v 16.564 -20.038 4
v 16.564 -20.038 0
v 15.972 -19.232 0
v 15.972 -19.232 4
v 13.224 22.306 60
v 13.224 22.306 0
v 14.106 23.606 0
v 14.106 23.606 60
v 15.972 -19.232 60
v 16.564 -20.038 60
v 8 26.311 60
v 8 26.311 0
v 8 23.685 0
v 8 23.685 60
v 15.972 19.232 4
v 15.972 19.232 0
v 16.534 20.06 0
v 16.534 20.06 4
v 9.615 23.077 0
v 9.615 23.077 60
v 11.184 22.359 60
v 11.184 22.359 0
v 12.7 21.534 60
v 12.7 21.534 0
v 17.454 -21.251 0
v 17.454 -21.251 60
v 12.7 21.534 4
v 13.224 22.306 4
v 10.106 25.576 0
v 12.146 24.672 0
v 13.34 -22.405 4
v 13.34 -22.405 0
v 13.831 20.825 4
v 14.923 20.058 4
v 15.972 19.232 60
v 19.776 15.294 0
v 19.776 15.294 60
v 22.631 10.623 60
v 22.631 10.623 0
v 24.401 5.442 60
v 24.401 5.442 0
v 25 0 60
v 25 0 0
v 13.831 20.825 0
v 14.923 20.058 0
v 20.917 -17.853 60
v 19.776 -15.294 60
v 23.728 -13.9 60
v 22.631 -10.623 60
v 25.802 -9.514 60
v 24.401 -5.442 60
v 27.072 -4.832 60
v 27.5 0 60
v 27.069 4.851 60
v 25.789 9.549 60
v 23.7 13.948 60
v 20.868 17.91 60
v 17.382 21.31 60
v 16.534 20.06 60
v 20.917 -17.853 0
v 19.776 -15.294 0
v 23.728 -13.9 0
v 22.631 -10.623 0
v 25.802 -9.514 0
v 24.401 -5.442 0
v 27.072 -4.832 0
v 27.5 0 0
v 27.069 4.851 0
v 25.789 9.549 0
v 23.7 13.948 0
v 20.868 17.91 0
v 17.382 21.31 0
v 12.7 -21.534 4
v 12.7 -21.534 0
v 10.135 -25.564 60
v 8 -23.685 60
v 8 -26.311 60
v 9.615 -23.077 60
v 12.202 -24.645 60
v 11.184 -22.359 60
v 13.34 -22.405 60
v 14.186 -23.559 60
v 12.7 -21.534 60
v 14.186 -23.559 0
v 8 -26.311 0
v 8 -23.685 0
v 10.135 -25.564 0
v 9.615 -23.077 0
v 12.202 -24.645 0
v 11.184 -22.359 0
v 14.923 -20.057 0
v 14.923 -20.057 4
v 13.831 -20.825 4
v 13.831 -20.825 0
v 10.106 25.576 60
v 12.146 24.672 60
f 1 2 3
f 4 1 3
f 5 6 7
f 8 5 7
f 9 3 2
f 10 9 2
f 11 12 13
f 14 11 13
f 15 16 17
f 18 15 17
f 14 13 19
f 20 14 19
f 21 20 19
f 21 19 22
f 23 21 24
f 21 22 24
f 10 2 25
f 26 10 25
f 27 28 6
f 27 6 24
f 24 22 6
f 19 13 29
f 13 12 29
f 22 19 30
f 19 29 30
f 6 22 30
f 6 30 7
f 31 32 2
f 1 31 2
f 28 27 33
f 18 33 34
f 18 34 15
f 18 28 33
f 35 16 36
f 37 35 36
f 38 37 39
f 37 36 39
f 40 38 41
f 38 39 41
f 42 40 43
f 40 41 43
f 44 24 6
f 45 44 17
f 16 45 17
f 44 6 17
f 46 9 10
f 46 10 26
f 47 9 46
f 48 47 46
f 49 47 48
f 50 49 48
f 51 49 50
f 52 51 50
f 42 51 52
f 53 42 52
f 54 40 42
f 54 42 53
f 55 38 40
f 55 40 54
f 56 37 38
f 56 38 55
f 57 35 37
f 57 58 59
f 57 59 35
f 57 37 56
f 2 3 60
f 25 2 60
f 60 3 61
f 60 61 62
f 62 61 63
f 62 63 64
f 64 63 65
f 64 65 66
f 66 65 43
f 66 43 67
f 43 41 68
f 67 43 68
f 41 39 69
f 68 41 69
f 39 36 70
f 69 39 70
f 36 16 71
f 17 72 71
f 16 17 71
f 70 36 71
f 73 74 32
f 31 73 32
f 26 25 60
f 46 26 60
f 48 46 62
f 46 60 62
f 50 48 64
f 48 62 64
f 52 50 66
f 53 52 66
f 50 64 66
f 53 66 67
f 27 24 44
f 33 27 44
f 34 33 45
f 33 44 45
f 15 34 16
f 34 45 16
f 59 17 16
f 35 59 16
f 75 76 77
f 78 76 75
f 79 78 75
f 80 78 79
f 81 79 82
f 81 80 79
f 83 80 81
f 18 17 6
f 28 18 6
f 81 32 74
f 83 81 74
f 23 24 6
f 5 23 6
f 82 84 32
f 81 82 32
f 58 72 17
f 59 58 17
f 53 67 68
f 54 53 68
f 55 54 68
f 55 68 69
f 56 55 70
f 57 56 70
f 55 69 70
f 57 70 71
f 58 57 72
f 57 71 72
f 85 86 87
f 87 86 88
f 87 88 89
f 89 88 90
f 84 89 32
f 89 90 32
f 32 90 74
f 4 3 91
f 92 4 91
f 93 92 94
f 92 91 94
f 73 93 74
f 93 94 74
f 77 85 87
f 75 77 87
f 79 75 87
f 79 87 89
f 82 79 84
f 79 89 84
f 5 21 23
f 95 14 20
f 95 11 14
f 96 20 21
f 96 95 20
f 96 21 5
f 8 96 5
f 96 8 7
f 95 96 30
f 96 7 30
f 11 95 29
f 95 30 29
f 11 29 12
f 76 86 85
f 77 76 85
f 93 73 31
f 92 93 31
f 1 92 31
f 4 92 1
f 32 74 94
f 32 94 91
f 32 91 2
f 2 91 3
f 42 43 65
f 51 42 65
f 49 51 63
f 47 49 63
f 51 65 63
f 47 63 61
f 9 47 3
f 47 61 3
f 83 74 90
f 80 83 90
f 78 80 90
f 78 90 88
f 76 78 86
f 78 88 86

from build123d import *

# Parameters (mm, degrees)
F1_DEPTH = 60
F2_DEPTH = 4


with BuildPart() as f1:
    # F0 (on Top) → F1 (new body)
    with BuildSketch(Plane.XY):
        with BuildLine():
            ThreePointArc((8, 23.6854385647), (10.4057353896, 22.7314907342), (12.6999615998, 21.5339493676))
            Line((12.6999615998, 21.5339493676), (13.2236473386, 22.3057931922))
            Line((13.2236473386, 22.3057931922), (14.1061536293, 23.6064912638))
            ThreePointArc((14.1061536293, 23.6064912638), (11.135466667, 25.1446094046), (8, 26.3106442338))
            Line((8, 26.3106442338), (8, 23.6854385647))
        make_face()
    extrude(amount=F1_DEPTH)


with BuildPart() as f1b:
    # F0 (on Top) → F1, piece 2 (new body)
    with BuildSketch(Plane.XY):
        with BuildLine():
            ThreePointArc((15.9722274119, 19.2324712792), (22.6307941232, 10.6229542667), (25, 0))
            ThreePointArc((25, 0), (22.6308481128, -10.6228392483), (15.9724229044, -19.2323089244))
            Line((15.9724229044, -19.2323089244), (16.5641458304, -20.0384503381))
            Line((16.5641458304, -20.0384503381), (17.4541433848, -21.2509500659))
            ThreePointArc((17.4541433848, -21.2509500659), (24.8620085983, -11.7528944715), (27.5, 0))
            ThreePointArc((27.5, 0), (24.8420158665, 11.7950942212), (17.3818728955, 21.310103112))
            Line((17.3818728955, 21.310103112), (16.5336807988, 20.0599796442))
            Line((16.5336807988, 20.0599796442), (15.9722274119, 19.2324712792))
        make_face()
    extrude(amount=F1_DEPTH)


with BuildPart() as f1c:
    # F0 (on Top) → F1, piece 3 (new body)
    with BuildSketch(Plane.XY):
        with BuildLine():
            Line((13.3395801756, -22.405342042), (12.6999615998, -21.5339493676))
            ThreePointArc((12.6999615998, -21.5339493676), (10.4057353896, -22.7314907342), (8, -23.6854385647))
            Line((8, -23.6854385647), (8, -26.3106442338))
            ThreePointArc((8, -26.3106442338), (11.1780514023, -25.1257072905), (14.18606212, -23.5585577132))
            Line((14.18606212, -23.5585577132), (13.3395801756, -22.405342042))
        make_face()
    extrude(amount=F1_DEPTH)


with BuildPart() as f2:
    # F0 (on Top) → F2 (new body)
    with BuildSketch(Plane.XY):
        with BuildLine():
            Line((16.5641458304, -20.0384503381), (15.9724229044, -19.2323089244))
            ThreePointArc((15.9724229044, -19.2323089244), (14.3823084194, -20.4486968907), (12.6999615998, -21.5339493676))
            Line((12.6999615998, -21.5339493676), (13.3395801756, -22.405342042))
            Line((13.3395801756, -22.405342042), (16.5641458304, -20.0384503381))
        make_face()
    extrude(amount=F2_DEPTH)


with BuildPart() as f2b:
    # F0 (on Top) → F2, piece 2 (new body)
    with BuildSketch(Plane.XY):
        with BuildLine():
            ThreePointArc((12.6999615998, 21.5339493676), (14.3822044912, 20.4487699868), (15.9722274119, 19.2324712792))
            Line((15.9722274119, 19.2324712792), (16.5336807988, 20.0599796442))
            Line((16.5336807988, 20.0599796442), (13.2236473386, 22.3057931922))
            Line((13.2236473386, 22.3057931922), (12.6999615998, 21.5339493676))
        make_face()
    extrude(amount=F2_DEPTH)


solid = Compound([f1.part, f1b.part, f1c.part, f2.part, f2b.part])
